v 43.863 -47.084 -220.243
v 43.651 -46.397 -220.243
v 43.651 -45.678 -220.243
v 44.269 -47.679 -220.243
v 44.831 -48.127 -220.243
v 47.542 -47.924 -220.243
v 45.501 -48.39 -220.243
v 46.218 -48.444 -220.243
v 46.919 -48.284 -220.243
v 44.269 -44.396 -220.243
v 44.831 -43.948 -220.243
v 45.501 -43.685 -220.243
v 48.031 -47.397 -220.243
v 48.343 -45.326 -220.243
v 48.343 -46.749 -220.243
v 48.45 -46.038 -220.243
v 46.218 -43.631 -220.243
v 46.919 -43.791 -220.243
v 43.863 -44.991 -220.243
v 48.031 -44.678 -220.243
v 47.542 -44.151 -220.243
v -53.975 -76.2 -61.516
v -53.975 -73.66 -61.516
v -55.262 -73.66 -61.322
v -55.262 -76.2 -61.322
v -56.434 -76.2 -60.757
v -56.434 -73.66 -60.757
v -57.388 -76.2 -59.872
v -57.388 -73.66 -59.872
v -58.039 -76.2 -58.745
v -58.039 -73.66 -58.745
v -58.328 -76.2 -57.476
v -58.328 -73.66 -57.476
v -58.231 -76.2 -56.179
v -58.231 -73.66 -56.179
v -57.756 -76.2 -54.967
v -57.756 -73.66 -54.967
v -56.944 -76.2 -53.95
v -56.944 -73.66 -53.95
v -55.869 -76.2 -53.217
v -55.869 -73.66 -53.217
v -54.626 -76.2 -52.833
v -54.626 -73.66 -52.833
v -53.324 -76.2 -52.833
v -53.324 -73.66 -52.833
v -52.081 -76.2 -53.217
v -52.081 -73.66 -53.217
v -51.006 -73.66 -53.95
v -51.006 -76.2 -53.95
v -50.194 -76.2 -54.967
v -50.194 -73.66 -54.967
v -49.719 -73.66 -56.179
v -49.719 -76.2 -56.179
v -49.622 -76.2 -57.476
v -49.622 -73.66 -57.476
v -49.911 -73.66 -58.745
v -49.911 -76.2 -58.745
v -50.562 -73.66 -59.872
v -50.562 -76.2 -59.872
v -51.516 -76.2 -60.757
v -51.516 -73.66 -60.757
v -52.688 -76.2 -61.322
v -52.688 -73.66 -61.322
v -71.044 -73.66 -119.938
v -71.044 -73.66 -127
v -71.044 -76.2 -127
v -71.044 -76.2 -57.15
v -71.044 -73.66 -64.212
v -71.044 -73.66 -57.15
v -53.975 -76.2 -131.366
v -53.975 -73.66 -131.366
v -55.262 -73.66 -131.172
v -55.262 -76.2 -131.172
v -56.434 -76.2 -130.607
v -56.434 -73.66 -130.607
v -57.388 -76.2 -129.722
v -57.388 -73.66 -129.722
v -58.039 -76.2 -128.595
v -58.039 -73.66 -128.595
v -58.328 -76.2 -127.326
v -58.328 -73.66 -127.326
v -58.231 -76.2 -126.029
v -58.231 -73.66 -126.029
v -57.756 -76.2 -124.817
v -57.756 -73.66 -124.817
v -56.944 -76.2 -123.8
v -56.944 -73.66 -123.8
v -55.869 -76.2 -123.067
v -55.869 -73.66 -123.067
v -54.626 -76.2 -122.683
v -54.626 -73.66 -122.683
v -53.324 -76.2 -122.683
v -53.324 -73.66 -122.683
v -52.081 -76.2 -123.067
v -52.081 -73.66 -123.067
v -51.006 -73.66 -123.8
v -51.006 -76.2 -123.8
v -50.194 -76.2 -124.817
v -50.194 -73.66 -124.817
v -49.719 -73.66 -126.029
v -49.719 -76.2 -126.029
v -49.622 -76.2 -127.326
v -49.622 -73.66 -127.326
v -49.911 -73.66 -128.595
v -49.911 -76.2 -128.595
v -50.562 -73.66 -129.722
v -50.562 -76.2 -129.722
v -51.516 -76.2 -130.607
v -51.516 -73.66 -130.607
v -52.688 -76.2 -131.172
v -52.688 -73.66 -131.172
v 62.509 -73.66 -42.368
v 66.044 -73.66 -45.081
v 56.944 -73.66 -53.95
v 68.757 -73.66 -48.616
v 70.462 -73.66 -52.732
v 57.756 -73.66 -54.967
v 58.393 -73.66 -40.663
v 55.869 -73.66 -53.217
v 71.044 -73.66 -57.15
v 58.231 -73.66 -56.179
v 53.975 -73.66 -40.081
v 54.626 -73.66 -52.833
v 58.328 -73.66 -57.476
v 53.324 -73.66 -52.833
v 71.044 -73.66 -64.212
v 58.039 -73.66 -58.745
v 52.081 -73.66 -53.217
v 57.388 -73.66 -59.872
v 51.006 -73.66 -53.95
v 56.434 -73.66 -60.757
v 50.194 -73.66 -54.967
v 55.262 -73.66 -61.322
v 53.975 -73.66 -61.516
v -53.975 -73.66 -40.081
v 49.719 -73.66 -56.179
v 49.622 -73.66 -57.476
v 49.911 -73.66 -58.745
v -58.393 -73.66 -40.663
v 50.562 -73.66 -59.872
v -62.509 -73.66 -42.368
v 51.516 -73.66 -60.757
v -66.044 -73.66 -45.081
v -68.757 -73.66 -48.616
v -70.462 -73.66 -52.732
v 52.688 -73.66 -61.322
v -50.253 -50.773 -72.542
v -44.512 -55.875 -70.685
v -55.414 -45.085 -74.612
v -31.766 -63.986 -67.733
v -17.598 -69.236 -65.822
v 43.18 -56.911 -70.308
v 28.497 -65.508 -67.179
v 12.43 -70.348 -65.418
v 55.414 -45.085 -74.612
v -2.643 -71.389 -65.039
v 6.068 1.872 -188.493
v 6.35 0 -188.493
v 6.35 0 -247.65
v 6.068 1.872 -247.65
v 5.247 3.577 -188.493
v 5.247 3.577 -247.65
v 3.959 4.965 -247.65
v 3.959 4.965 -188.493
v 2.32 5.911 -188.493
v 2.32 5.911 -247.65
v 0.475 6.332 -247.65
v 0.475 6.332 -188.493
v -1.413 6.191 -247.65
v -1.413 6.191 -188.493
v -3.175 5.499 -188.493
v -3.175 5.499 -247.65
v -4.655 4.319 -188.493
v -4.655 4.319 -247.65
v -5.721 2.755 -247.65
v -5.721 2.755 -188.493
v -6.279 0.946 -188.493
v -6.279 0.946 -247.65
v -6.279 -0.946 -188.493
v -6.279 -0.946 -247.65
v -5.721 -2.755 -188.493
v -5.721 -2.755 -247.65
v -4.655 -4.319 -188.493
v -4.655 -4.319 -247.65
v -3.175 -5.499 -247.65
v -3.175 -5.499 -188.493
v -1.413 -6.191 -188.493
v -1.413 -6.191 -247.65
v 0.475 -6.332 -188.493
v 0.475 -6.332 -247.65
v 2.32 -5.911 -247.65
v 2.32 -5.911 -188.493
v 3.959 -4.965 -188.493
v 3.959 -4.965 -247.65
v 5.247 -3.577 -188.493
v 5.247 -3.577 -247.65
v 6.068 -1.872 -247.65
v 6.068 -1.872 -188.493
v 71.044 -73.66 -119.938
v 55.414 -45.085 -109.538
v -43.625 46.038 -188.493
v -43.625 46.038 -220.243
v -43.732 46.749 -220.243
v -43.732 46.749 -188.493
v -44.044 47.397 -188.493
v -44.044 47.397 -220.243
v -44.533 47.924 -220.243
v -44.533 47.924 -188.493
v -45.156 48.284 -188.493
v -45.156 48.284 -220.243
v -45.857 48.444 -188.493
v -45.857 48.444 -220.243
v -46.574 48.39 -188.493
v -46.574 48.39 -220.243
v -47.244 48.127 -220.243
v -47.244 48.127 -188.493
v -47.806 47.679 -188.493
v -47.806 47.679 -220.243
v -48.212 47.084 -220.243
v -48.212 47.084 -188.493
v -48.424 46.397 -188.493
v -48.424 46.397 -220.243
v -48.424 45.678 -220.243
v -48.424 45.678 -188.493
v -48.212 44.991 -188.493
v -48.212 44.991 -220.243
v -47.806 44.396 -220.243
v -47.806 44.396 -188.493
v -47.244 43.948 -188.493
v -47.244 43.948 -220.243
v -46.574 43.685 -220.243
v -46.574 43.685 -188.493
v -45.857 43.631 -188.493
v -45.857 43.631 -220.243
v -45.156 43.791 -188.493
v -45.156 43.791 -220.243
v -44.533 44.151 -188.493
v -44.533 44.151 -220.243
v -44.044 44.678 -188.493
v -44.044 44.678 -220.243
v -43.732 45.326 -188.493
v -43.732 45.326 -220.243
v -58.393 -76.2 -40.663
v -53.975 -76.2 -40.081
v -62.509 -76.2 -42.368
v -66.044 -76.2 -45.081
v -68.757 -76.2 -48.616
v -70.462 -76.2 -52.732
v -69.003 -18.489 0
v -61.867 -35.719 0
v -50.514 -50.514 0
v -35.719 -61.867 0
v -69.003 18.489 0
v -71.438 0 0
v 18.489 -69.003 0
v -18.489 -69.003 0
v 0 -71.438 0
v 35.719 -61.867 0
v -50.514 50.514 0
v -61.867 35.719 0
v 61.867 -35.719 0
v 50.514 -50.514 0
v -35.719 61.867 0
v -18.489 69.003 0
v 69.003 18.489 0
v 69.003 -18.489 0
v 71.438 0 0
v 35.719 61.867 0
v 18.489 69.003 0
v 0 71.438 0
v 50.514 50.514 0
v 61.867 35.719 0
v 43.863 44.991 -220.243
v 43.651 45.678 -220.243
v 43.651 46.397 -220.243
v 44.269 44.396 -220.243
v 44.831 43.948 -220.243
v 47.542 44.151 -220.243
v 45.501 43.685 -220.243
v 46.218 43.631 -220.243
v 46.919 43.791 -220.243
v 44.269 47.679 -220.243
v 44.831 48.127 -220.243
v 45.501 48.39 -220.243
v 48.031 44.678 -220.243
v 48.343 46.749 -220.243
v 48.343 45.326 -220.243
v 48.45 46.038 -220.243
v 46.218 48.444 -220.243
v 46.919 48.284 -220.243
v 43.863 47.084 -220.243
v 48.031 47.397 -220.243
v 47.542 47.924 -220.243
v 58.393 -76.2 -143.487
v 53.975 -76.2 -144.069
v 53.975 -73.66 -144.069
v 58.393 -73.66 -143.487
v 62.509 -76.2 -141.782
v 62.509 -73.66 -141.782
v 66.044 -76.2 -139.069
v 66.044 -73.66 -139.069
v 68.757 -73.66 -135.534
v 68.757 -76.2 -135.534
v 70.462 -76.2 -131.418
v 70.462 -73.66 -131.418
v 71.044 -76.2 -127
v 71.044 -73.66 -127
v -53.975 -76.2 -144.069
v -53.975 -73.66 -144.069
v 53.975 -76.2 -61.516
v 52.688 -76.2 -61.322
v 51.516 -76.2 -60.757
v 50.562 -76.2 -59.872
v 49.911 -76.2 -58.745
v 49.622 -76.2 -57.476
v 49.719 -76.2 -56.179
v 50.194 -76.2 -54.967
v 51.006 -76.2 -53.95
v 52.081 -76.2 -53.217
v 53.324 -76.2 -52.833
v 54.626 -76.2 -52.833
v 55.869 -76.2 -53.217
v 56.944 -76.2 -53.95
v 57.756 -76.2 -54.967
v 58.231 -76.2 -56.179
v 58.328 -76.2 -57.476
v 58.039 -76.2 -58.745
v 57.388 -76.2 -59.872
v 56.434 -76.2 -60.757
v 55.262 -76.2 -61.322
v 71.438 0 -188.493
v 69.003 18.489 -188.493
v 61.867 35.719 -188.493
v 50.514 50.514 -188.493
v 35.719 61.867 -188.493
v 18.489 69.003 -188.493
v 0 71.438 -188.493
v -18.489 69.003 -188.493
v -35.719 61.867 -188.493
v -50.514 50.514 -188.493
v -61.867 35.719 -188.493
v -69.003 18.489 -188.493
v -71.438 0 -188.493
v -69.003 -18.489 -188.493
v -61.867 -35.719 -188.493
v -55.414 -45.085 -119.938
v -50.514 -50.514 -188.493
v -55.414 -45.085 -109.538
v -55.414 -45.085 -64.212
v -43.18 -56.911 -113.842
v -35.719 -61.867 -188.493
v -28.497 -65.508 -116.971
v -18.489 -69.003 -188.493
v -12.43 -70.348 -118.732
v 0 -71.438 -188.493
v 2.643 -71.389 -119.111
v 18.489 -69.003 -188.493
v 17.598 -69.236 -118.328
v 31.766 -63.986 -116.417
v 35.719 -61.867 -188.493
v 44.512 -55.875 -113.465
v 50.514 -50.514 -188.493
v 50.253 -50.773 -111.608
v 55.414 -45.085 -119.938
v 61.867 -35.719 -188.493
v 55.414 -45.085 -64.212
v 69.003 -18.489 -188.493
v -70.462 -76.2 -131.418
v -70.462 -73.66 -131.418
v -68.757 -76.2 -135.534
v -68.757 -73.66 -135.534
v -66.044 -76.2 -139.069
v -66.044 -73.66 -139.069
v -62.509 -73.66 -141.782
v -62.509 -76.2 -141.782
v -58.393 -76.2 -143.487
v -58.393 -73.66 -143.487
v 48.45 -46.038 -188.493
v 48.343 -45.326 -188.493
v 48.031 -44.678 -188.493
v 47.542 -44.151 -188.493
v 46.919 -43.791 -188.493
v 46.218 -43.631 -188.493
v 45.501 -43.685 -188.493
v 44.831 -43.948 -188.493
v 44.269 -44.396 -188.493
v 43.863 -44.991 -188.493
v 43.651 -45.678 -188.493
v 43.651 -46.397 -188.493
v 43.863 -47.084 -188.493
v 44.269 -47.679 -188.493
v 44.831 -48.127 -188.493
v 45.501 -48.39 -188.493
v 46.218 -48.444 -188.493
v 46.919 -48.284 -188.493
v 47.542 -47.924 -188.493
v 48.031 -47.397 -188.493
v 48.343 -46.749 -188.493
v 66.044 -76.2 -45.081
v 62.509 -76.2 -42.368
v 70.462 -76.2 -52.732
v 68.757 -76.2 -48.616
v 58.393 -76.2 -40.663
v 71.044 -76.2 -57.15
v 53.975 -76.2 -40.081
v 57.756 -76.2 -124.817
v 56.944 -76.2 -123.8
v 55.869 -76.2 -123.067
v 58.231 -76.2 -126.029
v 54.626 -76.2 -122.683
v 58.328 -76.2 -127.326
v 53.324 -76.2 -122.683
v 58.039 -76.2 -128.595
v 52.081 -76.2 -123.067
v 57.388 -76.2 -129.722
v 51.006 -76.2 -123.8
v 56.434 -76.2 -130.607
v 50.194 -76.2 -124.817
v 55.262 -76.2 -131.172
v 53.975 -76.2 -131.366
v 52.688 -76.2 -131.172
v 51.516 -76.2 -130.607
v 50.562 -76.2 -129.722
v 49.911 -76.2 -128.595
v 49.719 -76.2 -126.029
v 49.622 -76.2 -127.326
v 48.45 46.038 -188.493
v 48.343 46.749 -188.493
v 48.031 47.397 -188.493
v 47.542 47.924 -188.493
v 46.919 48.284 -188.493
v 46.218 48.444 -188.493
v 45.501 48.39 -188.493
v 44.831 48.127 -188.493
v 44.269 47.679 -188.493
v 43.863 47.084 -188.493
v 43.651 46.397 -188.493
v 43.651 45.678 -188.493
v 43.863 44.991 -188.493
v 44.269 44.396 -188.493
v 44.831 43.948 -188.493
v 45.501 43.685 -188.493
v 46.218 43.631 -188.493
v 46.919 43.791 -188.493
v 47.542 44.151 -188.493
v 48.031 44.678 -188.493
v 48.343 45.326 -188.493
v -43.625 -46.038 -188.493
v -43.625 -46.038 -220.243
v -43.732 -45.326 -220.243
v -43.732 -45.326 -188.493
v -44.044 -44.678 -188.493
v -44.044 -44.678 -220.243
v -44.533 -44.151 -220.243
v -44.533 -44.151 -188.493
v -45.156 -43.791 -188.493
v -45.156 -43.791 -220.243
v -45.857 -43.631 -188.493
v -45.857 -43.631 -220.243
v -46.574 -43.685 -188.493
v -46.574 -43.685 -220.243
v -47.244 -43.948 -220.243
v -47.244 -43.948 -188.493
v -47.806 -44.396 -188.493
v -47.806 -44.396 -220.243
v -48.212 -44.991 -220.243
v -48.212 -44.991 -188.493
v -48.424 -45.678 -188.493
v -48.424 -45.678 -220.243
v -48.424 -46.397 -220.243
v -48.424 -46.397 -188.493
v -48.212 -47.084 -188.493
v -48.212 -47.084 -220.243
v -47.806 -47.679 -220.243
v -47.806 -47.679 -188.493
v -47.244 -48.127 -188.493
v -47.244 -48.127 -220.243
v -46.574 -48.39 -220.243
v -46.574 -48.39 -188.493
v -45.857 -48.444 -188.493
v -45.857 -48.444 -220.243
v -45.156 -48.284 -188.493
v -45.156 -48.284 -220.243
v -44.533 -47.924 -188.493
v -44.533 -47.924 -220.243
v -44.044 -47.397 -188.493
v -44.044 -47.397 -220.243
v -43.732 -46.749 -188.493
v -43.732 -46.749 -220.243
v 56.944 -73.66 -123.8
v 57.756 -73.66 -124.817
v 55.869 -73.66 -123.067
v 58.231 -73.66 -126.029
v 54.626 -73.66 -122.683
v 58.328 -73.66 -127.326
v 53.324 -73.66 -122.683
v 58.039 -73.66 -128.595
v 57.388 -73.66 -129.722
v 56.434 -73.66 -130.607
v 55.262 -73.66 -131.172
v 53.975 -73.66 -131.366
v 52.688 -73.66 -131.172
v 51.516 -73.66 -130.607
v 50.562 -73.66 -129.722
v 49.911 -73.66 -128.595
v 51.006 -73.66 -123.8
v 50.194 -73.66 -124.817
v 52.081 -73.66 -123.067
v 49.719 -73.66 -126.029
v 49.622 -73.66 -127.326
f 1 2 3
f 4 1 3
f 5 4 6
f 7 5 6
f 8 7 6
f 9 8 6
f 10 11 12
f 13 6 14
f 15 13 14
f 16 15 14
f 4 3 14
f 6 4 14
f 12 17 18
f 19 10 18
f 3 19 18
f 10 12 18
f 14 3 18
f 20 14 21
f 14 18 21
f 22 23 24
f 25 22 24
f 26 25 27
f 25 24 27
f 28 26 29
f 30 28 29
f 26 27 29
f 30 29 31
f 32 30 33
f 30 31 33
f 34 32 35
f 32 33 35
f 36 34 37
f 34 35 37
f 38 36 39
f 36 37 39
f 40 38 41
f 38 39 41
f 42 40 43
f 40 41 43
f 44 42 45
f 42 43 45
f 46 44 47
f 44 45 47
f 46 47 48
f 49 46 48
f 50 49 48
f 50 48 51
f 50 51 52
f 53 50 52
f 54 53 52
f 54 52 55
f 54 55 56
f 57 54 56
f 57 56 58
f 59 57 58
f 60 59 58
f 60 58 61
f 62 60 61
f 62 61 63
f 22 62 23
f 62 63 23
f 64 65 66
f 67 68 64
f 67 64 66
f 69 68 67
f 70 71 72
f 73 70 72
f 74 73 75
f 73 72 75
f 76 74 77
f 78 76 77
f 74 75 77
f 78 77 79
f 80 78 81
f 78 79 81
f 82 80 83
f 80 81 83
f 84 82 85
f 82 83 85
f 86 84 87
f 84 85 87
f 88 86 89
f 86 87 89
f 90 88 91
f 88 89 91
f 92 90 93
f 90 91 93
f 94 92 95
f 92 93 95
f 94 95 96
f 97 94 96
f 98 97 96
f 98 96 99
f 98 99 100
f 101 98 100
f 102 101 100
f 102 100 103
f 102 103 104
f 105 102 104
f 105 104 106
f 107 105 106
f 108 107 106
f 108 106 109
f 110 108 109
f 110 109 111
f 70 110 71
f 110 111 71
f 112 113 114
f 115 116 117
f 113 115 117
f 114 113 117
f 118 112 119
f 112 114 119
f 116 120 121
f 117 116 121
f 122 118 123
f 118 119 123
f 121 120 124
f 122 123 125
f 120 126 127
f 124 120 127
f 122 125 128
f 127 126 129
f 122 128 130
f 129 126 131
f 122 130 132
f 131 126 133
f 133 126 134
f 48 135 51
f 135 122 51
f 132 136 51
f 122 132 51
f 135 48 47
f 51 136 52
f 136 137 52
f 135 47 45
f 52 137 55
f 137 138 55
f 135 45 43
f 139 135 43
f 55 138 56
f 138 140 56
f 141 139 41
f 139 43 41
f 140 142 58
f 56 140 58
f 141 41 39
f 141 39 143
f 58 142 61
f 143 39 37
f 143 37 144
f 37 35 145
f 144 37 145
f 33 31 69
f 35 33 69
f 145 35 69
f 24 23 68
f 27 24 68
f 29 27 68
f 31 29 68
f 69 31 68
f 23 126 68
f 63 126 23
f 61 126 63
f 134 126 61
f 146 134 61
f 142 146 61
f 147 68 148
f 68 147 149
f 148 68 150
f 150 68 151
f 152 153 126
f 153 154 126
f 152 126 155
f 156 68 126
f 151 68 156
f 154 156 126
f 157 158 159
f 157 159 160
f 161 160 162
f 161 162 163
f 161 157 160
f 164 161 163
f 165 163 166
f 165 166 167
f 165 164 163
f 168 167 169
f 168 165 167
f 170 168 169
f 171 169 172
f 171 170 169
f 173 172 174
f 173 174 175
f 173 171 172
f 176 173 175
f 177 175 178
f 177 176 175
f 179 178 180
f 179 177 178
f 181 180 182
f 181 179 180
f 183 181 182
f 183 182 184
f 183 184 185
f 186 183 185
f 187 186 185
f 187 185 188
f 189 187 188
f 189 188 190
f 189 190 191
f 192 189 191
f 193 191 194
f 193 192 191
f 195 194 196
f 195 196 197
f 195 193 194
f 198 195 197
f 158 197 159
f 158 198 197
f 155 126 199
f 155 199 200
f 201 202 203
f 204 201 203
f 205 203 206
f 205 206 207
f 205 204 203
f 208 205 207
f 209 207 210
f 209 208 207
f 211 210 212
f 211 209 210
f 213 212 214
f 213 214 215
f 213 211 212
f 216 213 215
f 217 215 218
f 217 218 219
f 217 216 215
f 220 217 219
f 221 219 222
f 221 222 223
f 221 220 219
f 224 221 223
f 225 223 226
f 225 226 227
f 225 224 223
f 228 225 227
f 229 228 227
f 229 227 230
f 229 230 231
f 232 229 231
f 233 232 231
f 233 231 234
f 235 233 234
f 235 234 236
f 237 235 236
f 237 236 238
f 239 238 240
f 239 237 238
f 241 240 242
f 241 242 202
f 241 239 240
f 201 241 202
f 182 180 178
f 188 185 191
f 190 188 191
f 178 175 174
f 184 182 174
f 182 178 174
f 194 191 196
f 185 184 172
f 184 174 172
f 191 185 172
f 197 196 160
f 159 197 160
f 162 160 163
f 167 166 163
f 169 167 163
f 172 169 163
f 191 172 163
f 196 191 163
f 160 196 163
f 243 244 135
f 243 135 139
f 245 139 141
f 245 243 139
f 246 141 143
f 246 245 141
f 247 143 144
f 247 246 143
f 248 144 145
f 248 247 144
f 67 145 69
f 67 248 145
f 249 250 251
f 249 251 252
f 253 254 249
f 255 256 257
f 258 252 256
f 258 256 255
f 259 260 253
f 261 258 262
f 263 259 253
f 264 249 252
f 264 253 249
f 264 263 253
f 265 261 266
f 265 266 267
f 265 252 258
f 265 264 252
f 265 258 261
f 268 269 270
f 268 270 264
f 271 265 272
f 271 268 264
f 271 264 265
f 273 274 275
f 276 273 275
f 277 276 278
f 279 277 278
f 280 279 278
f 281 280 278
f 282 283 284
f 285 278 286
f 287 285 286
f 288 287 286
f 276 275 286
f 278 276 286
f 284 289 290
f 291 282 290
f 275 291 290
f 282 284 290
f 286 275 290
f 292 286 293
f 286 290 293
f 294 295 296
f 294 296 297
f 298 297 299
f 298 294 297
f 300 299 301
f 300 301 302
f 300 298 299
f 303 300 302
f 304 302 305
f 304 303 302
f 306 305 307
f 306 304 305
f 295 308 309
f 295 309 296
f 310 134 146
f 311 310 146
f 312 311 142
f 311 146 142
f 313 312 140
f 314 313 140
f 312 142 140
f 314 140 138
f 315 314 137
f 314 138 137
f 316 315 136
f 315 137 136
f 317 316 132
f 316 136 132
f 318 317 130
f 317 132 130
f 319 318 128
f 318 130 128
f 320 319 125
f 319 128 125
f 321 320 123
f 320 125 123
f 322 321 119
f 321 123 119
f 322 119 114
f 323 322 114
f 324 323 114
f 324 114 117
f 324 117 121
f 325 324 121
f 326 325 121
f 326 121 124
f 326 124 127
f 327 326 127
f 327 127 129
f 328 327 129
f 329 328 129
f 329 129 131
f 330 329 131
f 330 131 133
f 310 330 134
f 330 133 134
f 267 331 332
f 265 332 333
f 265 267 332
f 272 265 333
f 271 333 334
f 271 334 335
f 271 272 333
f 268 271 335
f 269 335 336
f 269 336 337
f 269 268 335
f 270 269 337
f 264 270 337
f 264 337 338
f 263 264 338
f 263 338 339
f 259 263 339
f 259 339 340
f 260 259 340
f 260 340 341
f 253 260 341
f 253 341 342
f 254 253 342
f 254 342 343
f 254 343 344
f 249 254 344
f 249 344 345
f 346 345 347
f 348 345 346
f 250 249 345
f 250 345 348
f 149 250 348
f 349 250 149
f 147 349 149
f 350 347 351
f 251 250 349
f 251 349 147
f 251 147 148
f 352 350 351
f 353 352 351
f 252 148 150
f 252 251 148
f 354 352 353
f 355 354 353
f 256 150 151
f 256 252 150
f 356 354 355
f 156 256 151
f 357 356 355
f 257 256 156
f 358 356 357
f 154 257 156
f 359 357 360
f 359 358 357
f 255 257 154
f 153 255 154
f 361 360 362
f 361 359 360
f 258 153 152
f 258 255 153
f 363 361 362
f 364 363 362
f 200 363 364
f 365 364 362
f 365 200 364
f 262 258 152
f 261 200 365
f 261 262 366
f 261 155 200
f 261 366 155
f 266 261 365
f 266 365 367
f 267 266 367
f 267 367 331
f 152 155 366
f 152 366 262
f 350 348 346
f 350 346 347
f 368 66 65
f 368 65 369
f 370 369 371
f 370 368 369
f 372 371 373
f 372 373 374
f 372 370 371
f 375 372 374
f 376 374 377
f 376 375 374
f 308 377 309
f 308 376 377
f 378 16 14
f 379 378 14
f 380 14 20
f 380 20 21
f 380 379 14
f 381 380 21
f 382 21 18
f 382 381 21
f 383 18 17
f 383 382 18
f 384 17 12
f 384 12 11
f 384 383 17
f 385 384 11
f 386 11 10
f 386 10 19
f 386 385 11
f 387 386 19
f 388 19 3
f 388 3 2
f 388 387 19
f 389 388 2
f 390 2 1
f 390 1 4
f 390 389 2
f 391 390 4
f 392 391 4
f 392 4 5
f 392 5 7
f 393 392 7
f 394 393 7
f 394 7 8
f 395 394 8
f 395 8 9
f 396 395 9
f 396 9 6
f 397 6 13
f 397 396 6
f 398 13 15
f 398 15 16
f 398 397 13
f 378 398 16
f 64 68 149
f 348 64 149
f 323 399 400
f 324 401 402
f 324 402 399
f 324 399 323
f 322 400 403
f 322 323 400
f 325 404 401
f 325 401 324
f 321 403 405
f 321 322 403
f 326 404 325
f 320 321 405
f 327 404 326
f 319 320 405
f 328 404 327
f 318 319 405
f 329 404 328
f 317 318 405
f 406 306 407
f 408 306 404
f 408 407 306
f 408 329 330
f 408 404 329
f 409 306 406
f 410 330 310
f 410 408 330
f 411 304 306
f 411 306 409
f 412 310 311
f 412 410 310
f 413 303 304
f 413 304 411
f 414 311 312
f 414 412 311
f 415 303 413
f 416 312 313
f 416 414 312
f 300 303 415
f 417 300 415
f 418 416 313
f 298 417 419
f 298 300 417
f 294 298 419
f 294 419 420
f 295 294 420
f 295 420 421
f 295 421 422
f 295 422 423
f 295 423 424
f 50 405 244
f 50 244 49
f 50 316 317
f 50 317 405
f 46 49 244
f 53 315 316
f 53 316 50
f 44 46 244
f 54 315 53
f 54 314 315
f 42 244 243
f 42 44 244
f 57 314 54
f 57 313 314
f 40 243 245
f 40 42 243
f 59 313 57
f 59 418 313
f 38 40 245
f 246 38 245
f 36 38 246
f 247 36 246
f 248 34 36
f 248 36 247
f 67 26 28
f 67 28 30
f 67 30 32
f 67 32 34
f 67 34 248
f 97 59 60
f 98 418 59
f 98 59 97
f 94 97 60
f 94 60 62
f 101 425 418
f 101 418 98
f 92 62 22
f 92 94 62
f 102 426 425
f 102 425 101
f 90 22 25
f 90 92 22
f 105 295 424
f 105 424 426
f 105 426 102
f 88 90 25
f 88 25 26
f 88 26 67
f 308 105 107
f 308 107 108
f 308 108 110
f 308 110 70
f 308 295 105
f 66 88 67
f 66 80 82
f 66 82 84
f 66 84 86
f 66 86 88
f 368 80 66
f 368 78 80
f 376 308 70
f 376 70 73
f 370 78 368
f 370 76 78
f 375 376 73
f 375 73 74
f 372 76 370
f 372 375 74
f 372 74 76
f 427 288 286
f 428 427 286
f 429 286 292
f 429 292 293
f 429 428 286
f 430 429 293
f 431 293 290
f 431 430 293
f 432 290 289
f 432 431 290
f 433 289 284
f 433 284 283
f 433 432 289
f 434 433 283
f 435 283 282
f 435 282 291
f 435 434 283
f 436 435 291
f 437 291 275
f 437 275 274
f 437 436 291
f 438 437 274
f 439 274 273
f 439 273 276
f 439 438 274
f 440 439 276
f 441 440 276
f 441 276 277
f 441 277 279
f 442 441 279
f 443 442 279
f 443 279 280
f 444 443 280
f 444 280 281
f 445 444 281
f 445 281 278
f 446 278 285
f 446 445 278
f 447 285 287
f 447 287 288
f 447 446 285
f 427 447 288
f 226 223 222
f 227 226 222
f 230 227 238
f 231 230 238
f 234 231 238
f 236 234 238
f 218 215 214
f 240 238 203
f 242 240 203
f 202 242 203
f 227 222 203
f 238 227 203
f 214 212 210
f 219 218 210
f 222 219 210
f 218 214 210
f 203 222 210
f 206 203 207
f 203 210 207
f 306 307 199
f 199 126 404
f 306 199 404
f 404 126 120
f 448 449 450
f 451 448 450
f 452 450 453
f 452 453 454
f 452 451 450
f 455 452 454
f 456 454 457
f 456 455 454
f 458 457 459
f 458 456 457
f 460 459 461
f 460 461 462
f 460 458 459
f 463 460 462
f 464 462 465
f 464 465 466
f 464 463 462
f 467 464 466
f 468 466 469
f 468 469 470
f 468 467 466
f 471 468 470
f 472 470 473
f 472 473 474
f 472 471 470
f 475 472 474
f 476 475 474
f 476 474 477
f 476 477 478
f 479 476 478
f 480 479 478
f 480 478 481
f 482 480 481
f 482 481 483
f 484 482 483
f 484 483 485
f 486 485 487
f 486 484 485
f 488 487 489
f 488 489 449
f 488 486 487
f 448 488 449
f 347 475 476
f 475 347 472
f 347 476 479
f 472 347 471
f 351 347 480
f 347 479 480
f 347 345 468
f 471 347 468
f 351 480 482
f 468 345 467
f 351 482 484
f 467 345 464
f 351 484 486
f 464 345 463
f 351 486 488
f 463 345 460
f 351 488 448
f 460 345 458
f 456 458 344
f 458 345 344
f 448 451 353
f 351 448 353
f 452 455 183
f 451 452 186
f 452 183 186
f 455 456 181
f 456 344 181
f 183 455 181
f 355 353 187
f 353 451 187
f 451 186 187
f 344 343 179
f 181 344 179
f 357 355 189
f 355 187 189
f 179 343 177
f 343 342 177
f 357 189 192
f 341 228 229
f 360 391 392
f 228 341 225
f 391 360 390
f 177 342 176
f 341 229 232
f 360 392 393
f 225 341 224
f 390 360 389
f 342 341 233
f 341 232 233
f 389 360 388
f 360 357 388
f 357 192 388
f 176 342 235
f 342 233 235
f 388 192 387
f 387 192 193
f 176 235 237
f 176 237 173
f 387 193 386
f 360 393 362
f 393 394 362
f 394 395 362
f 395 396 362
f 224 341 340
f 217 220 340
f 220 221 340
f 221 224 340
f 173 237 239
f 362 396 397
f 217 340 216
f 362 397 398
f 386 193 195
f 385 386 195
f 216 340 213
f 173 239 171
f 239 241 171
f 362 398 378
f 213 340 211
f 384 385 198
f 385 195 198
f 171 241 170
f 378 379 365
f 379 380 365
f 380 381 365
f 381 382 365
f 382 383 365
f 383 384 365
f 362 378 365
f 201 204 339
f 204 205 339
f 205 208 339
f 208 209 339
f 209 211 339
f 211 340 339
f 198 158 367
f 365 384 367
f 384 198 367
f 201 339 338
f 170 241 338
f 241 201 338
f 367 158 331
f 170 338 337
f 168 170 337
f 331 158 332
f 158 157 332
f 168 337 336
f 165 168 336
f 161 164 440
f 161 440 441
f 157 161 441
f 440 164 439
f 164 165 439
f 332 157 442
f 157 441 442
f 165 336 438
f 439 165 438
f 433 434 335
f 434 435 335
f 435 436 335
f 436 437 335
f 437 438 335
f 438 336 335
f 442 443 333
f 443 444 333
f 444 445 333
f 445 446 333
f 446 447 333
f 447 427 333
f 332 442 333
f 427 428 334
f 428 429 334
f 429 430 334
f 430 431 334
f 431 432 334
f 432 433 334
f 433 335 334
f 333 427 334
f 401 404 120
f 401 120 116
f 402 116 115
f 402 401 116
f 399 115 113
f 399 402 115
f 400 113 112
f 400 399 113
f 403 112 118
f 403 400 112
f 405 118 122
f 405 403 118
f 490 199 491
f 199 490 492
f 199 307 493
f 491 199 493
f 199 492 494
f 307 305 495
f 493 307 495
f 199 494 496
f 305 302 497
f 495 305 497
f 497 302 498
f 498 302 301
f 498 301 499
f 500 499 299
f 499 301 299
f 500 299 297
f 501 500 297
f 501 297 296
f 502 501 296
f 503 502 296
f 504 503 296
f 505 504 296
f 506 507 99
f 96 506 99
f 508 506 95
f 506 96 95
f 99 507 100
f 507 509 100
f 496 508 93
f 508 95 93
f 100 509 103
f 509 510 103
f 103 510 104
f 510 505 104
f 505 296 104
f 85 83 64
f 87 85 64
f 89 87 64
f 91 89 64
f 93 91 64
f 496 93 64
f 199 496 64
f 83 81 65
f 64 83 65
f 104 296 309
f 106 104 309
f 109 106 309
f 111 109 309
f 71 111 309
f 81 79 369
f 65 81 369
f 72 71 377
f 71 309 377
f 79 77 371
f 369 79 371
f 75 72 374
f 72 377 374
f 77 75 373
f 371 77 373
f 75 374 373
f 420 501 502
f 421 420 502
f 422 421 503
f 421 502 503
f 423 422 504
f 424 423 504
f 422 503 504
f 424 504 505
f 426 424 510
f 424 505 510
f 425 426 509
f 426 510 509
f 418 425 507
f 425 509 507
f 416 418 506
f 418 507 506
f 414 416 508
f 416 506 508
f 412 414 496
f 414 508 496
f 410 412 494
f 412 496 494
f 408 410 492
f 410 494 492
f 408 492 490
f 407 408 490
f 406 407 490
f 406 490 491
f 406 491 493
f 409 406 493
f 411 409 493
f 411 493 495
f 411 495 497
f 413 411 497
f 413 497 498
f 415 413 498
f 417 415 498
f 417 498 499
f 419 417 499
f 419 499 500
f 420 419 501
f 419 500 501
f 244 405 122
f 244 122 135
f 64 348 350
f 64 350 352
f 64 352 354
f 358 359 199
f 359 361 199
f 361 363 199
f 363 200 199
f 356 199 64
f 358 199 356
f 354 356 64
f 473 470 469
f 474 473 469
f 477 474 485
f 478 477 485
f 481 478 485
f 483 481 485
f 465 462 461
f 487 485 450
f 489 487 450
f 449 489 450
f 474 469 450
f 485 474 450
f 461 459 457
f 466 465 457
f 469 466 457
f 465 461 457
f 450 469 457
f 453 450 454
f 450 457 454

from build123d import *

# Parameters (mm, degrees)
SKETCH2_R                                 = 71.4375
BOSS_EXTRUDE1_DEPTH                       = 188.4934
BOSS_EXTRUDE4_START                       = -188.4934
SKETCH2_3_R                               = 6.35
BOSS_EXTRUDE4_DEPTH                       = 59.1566
BOSS_EXTRUDE2_START                       = -76.2
BOSS_EXTRUDE2_DEPTH                       = 2.54
SKETCH5_W                                 = 4.365625
SKETCH5_H                                 = 147.6375
F_11_32_0_34375_DIAMETER_HOLE1_AT_2_COUNT = 2
F_11_32_0_34375_DIAMETER_HOLE1_AT_2_PITCH = 69.85
F_11_32_0_34375_DIAMETER_HOLE1_AT_3_COUNT = 2
F_11_32_0_34375_DIAMETER_HOLE1_AT_3_PITCH = 128.577700244
F_11_32_0_34375_DIAMETER_HOLE1_AT_4_COUNT = 2
F_11_32_0_34375_DIAMETER_HOLE1_AT_4_PITCH = 107.95
BOSS_EXTRUDE3_START                       = 71.0438
BOSS_EXTRUDE3_DEPTH                       = 142.0876
CUT_EXTRUDE1_START                        = -119.937949444
CUT_EXTRUDE1_DEPTH                        = 55.725898888
BOSS_EXTRUDE5_START                       = -188.4934
SKETCH8_R                                 = 2.413
BOSS_EXTRUDE5_DEPTH                       = 31.75


# Read off the part's stored shape, not the designer's step: Cut-Extrude1
with BuildPart() as part:
    # Sketch2 → Boss-Extrude1 (new body)
    with BuildSketch(Plane.XY):
        Circle(SKETCH2_R)
    extrude(amount=-BOSS_EXTRUDE1_DEPTH)

    # Sketch2<3> → Boss-Extrude4 (add)
    with BuildSketch(Plane.XY.offset(BOSS_EXTRUDE4_START)):
        Circle(SKETCH2_3_R)
    extrude(amount=-BOSS_EXTRUDE4_DEPTH)



with BuildPart() as body_2:
    # Sketch3 → Boss-Extrude2 (new body)
    with BuildSketch(Plane(origin=(0, 0, 0), x_dir=(1, 0, 0), z_dir=(0, 1, 0)).offset(BOSS_EXTRUDE2_START)):
        with BuildLine():
            Line((-53.975, 144.0688), (53.975, 144.0688))
            ThreePointArc((53.975, 144.0688), (66.044464227, 139.069464227), (71.0438, 127))
            Line((71.0438, 127), (71.0438, 57.15))
            ThreePointArc((71.0438, 57.15), (66.044464227, 45.080535773), (53.975, 40.0812))
            Line((53.975, 40.0812), (-53.975, 40.0812))
            ThreePointArc((-53.975, 40.0812), (-66.044464227, 45.080535773), (-71.0438, 57.15))
            Line((-71.0438, 57.15), (-71.0438, 127))
            ThreePointArc((-71.0438, 127), (-66.044464227, 139.069464227), (-53.975, 144.0688))
        make_face()
    extrude(amount=BOSS_EXTRUDE2_DEPTH)

    # Sketch5 → 11/32 (0.34375) Diameter Hole1 (revolve, cut)
    with BuildSketch(Plane(origin=(-53.975, -76.2, -127), x_dir=(0, 0, -1), z_dir=(1, 0, 0))):
        with Locations((2.1828125, 73.81875)):
            Rectangle(SKETCH5_W, SKETCH5_H)
    f_11_32_0_34375_diameter_hole1 = revolve(axis=Axis((-53.975, -82.55, -127), (0, 1, 0)), mode=Mode.SUBTRACT)

    # 11/32 (0.34375) Diameter Hole1 at 2: 11/32 (0.34375) Diameter Hole1 ×2
    with Locations(*[(0, 0, i * F_11_32_0_34375_DIAMETER_HOLE1_AT_2_PITCH) for i in range(1, F_11_32_0_34375_DIAMETER_HOLE1_AT_2_COUNT)]):
        add(f_11_32_0_34375_diameter_hole1, mode=Mode.SUBTRACT)

    # 11/32 (0.34375) Diameter Hole1 at 3: 11/32 (0.34375) Diameter Hole1 ×2
    with Locations(*[Vector(0.8395701571521513, 0, 0.543251278157274) * (i * F_11_32_0_34375_DIAMETER_HOLE1_AT_3_PITCH) for i in range(1, F_11_32_0_34375_DIAMETER_HOLE1_AT_3_COUNT)]):
        add(f_11_32_0_34375_diameter_hole1, mode=Mode.SUBTRACT)

    # 11/32 (0.34375) Diameter Hole1 at 4: 11/32 (0.34375) Diameter Hole1 ×2
    with Locations(*[(i * F_11_32_0_34375_DIAMETER_HOLE1_AT_4_PITCH, 0, 0) for i in range(1, F_11_32_0_34375_DIAMETER_HOLE1_AT_4_COUNT)]):
        add(f_11_32_0_34375_diameter_hole1, mode=Mode.SUBTRACT)


with BuildPart() as part_1:
    add(part.part)

    add(body_2.part)  # Boss-Extrude3 merges body 2
    # Sketch6 → Boss-Extrude3 (add)
    with BuildSketch(Plane(origin=(0, 0, 0), x_dir=(0, 0, -1), z_dir=(1, 0, 0)).offset(BOSS_EXTRUDE3_START)):
        Polygon((64.212050556, -73.66), (74.6125, -45.085), (109.5375, -45.085), (119.937949444, -73.66), align=None)
    extrude(amount=-BOSS_EXTRUDE3_DEPTH)

    # Cut-Extrude1 outline → Cut-Extrude1 (cut)
    with BuildSketch(Plane.XY.offset(CUT_EXTRUDE1_START)):
        Polygon((-71.0438, -73.66), (-55.413528865, -45.085), (-71.0438, -45.085), align=None)
    cut_extrude1 = extrude(amount=CUT_EXTRUDE1_DEPTH, mode=Mode.SUBTRACT)

    # Mirror2: Cut-Extrude1 across plane
    add(cut_extrude1.mirror(Plane(origin=(0, 0, 0), x_dir=(0, 0, 1), z_dir=(1, 0, 0))), mode=Mode.SUBTRACT)

    # Sketch8 → Boss-Extrude5 (add)
    with BuildSketch(Plane.XY.offset(BOSS_EXTRUDE5_START)):
        with Locations((46.0375, -46.0375)):
            Circle(SKETCH8_R)
        with Locations((46.0375, 46.0375)):
            Circle(SKETCH8_R)
        with Locations((-46.0375, 46.0375)):
            Circle(SKETCH8_R)
        with Locations((-46.0375, -46.0375)):
            Circle(SKETCH8_R)
    extrude(amount=-BOSS_EXTRUDE5_DEPTH)


solid = part_1.part
